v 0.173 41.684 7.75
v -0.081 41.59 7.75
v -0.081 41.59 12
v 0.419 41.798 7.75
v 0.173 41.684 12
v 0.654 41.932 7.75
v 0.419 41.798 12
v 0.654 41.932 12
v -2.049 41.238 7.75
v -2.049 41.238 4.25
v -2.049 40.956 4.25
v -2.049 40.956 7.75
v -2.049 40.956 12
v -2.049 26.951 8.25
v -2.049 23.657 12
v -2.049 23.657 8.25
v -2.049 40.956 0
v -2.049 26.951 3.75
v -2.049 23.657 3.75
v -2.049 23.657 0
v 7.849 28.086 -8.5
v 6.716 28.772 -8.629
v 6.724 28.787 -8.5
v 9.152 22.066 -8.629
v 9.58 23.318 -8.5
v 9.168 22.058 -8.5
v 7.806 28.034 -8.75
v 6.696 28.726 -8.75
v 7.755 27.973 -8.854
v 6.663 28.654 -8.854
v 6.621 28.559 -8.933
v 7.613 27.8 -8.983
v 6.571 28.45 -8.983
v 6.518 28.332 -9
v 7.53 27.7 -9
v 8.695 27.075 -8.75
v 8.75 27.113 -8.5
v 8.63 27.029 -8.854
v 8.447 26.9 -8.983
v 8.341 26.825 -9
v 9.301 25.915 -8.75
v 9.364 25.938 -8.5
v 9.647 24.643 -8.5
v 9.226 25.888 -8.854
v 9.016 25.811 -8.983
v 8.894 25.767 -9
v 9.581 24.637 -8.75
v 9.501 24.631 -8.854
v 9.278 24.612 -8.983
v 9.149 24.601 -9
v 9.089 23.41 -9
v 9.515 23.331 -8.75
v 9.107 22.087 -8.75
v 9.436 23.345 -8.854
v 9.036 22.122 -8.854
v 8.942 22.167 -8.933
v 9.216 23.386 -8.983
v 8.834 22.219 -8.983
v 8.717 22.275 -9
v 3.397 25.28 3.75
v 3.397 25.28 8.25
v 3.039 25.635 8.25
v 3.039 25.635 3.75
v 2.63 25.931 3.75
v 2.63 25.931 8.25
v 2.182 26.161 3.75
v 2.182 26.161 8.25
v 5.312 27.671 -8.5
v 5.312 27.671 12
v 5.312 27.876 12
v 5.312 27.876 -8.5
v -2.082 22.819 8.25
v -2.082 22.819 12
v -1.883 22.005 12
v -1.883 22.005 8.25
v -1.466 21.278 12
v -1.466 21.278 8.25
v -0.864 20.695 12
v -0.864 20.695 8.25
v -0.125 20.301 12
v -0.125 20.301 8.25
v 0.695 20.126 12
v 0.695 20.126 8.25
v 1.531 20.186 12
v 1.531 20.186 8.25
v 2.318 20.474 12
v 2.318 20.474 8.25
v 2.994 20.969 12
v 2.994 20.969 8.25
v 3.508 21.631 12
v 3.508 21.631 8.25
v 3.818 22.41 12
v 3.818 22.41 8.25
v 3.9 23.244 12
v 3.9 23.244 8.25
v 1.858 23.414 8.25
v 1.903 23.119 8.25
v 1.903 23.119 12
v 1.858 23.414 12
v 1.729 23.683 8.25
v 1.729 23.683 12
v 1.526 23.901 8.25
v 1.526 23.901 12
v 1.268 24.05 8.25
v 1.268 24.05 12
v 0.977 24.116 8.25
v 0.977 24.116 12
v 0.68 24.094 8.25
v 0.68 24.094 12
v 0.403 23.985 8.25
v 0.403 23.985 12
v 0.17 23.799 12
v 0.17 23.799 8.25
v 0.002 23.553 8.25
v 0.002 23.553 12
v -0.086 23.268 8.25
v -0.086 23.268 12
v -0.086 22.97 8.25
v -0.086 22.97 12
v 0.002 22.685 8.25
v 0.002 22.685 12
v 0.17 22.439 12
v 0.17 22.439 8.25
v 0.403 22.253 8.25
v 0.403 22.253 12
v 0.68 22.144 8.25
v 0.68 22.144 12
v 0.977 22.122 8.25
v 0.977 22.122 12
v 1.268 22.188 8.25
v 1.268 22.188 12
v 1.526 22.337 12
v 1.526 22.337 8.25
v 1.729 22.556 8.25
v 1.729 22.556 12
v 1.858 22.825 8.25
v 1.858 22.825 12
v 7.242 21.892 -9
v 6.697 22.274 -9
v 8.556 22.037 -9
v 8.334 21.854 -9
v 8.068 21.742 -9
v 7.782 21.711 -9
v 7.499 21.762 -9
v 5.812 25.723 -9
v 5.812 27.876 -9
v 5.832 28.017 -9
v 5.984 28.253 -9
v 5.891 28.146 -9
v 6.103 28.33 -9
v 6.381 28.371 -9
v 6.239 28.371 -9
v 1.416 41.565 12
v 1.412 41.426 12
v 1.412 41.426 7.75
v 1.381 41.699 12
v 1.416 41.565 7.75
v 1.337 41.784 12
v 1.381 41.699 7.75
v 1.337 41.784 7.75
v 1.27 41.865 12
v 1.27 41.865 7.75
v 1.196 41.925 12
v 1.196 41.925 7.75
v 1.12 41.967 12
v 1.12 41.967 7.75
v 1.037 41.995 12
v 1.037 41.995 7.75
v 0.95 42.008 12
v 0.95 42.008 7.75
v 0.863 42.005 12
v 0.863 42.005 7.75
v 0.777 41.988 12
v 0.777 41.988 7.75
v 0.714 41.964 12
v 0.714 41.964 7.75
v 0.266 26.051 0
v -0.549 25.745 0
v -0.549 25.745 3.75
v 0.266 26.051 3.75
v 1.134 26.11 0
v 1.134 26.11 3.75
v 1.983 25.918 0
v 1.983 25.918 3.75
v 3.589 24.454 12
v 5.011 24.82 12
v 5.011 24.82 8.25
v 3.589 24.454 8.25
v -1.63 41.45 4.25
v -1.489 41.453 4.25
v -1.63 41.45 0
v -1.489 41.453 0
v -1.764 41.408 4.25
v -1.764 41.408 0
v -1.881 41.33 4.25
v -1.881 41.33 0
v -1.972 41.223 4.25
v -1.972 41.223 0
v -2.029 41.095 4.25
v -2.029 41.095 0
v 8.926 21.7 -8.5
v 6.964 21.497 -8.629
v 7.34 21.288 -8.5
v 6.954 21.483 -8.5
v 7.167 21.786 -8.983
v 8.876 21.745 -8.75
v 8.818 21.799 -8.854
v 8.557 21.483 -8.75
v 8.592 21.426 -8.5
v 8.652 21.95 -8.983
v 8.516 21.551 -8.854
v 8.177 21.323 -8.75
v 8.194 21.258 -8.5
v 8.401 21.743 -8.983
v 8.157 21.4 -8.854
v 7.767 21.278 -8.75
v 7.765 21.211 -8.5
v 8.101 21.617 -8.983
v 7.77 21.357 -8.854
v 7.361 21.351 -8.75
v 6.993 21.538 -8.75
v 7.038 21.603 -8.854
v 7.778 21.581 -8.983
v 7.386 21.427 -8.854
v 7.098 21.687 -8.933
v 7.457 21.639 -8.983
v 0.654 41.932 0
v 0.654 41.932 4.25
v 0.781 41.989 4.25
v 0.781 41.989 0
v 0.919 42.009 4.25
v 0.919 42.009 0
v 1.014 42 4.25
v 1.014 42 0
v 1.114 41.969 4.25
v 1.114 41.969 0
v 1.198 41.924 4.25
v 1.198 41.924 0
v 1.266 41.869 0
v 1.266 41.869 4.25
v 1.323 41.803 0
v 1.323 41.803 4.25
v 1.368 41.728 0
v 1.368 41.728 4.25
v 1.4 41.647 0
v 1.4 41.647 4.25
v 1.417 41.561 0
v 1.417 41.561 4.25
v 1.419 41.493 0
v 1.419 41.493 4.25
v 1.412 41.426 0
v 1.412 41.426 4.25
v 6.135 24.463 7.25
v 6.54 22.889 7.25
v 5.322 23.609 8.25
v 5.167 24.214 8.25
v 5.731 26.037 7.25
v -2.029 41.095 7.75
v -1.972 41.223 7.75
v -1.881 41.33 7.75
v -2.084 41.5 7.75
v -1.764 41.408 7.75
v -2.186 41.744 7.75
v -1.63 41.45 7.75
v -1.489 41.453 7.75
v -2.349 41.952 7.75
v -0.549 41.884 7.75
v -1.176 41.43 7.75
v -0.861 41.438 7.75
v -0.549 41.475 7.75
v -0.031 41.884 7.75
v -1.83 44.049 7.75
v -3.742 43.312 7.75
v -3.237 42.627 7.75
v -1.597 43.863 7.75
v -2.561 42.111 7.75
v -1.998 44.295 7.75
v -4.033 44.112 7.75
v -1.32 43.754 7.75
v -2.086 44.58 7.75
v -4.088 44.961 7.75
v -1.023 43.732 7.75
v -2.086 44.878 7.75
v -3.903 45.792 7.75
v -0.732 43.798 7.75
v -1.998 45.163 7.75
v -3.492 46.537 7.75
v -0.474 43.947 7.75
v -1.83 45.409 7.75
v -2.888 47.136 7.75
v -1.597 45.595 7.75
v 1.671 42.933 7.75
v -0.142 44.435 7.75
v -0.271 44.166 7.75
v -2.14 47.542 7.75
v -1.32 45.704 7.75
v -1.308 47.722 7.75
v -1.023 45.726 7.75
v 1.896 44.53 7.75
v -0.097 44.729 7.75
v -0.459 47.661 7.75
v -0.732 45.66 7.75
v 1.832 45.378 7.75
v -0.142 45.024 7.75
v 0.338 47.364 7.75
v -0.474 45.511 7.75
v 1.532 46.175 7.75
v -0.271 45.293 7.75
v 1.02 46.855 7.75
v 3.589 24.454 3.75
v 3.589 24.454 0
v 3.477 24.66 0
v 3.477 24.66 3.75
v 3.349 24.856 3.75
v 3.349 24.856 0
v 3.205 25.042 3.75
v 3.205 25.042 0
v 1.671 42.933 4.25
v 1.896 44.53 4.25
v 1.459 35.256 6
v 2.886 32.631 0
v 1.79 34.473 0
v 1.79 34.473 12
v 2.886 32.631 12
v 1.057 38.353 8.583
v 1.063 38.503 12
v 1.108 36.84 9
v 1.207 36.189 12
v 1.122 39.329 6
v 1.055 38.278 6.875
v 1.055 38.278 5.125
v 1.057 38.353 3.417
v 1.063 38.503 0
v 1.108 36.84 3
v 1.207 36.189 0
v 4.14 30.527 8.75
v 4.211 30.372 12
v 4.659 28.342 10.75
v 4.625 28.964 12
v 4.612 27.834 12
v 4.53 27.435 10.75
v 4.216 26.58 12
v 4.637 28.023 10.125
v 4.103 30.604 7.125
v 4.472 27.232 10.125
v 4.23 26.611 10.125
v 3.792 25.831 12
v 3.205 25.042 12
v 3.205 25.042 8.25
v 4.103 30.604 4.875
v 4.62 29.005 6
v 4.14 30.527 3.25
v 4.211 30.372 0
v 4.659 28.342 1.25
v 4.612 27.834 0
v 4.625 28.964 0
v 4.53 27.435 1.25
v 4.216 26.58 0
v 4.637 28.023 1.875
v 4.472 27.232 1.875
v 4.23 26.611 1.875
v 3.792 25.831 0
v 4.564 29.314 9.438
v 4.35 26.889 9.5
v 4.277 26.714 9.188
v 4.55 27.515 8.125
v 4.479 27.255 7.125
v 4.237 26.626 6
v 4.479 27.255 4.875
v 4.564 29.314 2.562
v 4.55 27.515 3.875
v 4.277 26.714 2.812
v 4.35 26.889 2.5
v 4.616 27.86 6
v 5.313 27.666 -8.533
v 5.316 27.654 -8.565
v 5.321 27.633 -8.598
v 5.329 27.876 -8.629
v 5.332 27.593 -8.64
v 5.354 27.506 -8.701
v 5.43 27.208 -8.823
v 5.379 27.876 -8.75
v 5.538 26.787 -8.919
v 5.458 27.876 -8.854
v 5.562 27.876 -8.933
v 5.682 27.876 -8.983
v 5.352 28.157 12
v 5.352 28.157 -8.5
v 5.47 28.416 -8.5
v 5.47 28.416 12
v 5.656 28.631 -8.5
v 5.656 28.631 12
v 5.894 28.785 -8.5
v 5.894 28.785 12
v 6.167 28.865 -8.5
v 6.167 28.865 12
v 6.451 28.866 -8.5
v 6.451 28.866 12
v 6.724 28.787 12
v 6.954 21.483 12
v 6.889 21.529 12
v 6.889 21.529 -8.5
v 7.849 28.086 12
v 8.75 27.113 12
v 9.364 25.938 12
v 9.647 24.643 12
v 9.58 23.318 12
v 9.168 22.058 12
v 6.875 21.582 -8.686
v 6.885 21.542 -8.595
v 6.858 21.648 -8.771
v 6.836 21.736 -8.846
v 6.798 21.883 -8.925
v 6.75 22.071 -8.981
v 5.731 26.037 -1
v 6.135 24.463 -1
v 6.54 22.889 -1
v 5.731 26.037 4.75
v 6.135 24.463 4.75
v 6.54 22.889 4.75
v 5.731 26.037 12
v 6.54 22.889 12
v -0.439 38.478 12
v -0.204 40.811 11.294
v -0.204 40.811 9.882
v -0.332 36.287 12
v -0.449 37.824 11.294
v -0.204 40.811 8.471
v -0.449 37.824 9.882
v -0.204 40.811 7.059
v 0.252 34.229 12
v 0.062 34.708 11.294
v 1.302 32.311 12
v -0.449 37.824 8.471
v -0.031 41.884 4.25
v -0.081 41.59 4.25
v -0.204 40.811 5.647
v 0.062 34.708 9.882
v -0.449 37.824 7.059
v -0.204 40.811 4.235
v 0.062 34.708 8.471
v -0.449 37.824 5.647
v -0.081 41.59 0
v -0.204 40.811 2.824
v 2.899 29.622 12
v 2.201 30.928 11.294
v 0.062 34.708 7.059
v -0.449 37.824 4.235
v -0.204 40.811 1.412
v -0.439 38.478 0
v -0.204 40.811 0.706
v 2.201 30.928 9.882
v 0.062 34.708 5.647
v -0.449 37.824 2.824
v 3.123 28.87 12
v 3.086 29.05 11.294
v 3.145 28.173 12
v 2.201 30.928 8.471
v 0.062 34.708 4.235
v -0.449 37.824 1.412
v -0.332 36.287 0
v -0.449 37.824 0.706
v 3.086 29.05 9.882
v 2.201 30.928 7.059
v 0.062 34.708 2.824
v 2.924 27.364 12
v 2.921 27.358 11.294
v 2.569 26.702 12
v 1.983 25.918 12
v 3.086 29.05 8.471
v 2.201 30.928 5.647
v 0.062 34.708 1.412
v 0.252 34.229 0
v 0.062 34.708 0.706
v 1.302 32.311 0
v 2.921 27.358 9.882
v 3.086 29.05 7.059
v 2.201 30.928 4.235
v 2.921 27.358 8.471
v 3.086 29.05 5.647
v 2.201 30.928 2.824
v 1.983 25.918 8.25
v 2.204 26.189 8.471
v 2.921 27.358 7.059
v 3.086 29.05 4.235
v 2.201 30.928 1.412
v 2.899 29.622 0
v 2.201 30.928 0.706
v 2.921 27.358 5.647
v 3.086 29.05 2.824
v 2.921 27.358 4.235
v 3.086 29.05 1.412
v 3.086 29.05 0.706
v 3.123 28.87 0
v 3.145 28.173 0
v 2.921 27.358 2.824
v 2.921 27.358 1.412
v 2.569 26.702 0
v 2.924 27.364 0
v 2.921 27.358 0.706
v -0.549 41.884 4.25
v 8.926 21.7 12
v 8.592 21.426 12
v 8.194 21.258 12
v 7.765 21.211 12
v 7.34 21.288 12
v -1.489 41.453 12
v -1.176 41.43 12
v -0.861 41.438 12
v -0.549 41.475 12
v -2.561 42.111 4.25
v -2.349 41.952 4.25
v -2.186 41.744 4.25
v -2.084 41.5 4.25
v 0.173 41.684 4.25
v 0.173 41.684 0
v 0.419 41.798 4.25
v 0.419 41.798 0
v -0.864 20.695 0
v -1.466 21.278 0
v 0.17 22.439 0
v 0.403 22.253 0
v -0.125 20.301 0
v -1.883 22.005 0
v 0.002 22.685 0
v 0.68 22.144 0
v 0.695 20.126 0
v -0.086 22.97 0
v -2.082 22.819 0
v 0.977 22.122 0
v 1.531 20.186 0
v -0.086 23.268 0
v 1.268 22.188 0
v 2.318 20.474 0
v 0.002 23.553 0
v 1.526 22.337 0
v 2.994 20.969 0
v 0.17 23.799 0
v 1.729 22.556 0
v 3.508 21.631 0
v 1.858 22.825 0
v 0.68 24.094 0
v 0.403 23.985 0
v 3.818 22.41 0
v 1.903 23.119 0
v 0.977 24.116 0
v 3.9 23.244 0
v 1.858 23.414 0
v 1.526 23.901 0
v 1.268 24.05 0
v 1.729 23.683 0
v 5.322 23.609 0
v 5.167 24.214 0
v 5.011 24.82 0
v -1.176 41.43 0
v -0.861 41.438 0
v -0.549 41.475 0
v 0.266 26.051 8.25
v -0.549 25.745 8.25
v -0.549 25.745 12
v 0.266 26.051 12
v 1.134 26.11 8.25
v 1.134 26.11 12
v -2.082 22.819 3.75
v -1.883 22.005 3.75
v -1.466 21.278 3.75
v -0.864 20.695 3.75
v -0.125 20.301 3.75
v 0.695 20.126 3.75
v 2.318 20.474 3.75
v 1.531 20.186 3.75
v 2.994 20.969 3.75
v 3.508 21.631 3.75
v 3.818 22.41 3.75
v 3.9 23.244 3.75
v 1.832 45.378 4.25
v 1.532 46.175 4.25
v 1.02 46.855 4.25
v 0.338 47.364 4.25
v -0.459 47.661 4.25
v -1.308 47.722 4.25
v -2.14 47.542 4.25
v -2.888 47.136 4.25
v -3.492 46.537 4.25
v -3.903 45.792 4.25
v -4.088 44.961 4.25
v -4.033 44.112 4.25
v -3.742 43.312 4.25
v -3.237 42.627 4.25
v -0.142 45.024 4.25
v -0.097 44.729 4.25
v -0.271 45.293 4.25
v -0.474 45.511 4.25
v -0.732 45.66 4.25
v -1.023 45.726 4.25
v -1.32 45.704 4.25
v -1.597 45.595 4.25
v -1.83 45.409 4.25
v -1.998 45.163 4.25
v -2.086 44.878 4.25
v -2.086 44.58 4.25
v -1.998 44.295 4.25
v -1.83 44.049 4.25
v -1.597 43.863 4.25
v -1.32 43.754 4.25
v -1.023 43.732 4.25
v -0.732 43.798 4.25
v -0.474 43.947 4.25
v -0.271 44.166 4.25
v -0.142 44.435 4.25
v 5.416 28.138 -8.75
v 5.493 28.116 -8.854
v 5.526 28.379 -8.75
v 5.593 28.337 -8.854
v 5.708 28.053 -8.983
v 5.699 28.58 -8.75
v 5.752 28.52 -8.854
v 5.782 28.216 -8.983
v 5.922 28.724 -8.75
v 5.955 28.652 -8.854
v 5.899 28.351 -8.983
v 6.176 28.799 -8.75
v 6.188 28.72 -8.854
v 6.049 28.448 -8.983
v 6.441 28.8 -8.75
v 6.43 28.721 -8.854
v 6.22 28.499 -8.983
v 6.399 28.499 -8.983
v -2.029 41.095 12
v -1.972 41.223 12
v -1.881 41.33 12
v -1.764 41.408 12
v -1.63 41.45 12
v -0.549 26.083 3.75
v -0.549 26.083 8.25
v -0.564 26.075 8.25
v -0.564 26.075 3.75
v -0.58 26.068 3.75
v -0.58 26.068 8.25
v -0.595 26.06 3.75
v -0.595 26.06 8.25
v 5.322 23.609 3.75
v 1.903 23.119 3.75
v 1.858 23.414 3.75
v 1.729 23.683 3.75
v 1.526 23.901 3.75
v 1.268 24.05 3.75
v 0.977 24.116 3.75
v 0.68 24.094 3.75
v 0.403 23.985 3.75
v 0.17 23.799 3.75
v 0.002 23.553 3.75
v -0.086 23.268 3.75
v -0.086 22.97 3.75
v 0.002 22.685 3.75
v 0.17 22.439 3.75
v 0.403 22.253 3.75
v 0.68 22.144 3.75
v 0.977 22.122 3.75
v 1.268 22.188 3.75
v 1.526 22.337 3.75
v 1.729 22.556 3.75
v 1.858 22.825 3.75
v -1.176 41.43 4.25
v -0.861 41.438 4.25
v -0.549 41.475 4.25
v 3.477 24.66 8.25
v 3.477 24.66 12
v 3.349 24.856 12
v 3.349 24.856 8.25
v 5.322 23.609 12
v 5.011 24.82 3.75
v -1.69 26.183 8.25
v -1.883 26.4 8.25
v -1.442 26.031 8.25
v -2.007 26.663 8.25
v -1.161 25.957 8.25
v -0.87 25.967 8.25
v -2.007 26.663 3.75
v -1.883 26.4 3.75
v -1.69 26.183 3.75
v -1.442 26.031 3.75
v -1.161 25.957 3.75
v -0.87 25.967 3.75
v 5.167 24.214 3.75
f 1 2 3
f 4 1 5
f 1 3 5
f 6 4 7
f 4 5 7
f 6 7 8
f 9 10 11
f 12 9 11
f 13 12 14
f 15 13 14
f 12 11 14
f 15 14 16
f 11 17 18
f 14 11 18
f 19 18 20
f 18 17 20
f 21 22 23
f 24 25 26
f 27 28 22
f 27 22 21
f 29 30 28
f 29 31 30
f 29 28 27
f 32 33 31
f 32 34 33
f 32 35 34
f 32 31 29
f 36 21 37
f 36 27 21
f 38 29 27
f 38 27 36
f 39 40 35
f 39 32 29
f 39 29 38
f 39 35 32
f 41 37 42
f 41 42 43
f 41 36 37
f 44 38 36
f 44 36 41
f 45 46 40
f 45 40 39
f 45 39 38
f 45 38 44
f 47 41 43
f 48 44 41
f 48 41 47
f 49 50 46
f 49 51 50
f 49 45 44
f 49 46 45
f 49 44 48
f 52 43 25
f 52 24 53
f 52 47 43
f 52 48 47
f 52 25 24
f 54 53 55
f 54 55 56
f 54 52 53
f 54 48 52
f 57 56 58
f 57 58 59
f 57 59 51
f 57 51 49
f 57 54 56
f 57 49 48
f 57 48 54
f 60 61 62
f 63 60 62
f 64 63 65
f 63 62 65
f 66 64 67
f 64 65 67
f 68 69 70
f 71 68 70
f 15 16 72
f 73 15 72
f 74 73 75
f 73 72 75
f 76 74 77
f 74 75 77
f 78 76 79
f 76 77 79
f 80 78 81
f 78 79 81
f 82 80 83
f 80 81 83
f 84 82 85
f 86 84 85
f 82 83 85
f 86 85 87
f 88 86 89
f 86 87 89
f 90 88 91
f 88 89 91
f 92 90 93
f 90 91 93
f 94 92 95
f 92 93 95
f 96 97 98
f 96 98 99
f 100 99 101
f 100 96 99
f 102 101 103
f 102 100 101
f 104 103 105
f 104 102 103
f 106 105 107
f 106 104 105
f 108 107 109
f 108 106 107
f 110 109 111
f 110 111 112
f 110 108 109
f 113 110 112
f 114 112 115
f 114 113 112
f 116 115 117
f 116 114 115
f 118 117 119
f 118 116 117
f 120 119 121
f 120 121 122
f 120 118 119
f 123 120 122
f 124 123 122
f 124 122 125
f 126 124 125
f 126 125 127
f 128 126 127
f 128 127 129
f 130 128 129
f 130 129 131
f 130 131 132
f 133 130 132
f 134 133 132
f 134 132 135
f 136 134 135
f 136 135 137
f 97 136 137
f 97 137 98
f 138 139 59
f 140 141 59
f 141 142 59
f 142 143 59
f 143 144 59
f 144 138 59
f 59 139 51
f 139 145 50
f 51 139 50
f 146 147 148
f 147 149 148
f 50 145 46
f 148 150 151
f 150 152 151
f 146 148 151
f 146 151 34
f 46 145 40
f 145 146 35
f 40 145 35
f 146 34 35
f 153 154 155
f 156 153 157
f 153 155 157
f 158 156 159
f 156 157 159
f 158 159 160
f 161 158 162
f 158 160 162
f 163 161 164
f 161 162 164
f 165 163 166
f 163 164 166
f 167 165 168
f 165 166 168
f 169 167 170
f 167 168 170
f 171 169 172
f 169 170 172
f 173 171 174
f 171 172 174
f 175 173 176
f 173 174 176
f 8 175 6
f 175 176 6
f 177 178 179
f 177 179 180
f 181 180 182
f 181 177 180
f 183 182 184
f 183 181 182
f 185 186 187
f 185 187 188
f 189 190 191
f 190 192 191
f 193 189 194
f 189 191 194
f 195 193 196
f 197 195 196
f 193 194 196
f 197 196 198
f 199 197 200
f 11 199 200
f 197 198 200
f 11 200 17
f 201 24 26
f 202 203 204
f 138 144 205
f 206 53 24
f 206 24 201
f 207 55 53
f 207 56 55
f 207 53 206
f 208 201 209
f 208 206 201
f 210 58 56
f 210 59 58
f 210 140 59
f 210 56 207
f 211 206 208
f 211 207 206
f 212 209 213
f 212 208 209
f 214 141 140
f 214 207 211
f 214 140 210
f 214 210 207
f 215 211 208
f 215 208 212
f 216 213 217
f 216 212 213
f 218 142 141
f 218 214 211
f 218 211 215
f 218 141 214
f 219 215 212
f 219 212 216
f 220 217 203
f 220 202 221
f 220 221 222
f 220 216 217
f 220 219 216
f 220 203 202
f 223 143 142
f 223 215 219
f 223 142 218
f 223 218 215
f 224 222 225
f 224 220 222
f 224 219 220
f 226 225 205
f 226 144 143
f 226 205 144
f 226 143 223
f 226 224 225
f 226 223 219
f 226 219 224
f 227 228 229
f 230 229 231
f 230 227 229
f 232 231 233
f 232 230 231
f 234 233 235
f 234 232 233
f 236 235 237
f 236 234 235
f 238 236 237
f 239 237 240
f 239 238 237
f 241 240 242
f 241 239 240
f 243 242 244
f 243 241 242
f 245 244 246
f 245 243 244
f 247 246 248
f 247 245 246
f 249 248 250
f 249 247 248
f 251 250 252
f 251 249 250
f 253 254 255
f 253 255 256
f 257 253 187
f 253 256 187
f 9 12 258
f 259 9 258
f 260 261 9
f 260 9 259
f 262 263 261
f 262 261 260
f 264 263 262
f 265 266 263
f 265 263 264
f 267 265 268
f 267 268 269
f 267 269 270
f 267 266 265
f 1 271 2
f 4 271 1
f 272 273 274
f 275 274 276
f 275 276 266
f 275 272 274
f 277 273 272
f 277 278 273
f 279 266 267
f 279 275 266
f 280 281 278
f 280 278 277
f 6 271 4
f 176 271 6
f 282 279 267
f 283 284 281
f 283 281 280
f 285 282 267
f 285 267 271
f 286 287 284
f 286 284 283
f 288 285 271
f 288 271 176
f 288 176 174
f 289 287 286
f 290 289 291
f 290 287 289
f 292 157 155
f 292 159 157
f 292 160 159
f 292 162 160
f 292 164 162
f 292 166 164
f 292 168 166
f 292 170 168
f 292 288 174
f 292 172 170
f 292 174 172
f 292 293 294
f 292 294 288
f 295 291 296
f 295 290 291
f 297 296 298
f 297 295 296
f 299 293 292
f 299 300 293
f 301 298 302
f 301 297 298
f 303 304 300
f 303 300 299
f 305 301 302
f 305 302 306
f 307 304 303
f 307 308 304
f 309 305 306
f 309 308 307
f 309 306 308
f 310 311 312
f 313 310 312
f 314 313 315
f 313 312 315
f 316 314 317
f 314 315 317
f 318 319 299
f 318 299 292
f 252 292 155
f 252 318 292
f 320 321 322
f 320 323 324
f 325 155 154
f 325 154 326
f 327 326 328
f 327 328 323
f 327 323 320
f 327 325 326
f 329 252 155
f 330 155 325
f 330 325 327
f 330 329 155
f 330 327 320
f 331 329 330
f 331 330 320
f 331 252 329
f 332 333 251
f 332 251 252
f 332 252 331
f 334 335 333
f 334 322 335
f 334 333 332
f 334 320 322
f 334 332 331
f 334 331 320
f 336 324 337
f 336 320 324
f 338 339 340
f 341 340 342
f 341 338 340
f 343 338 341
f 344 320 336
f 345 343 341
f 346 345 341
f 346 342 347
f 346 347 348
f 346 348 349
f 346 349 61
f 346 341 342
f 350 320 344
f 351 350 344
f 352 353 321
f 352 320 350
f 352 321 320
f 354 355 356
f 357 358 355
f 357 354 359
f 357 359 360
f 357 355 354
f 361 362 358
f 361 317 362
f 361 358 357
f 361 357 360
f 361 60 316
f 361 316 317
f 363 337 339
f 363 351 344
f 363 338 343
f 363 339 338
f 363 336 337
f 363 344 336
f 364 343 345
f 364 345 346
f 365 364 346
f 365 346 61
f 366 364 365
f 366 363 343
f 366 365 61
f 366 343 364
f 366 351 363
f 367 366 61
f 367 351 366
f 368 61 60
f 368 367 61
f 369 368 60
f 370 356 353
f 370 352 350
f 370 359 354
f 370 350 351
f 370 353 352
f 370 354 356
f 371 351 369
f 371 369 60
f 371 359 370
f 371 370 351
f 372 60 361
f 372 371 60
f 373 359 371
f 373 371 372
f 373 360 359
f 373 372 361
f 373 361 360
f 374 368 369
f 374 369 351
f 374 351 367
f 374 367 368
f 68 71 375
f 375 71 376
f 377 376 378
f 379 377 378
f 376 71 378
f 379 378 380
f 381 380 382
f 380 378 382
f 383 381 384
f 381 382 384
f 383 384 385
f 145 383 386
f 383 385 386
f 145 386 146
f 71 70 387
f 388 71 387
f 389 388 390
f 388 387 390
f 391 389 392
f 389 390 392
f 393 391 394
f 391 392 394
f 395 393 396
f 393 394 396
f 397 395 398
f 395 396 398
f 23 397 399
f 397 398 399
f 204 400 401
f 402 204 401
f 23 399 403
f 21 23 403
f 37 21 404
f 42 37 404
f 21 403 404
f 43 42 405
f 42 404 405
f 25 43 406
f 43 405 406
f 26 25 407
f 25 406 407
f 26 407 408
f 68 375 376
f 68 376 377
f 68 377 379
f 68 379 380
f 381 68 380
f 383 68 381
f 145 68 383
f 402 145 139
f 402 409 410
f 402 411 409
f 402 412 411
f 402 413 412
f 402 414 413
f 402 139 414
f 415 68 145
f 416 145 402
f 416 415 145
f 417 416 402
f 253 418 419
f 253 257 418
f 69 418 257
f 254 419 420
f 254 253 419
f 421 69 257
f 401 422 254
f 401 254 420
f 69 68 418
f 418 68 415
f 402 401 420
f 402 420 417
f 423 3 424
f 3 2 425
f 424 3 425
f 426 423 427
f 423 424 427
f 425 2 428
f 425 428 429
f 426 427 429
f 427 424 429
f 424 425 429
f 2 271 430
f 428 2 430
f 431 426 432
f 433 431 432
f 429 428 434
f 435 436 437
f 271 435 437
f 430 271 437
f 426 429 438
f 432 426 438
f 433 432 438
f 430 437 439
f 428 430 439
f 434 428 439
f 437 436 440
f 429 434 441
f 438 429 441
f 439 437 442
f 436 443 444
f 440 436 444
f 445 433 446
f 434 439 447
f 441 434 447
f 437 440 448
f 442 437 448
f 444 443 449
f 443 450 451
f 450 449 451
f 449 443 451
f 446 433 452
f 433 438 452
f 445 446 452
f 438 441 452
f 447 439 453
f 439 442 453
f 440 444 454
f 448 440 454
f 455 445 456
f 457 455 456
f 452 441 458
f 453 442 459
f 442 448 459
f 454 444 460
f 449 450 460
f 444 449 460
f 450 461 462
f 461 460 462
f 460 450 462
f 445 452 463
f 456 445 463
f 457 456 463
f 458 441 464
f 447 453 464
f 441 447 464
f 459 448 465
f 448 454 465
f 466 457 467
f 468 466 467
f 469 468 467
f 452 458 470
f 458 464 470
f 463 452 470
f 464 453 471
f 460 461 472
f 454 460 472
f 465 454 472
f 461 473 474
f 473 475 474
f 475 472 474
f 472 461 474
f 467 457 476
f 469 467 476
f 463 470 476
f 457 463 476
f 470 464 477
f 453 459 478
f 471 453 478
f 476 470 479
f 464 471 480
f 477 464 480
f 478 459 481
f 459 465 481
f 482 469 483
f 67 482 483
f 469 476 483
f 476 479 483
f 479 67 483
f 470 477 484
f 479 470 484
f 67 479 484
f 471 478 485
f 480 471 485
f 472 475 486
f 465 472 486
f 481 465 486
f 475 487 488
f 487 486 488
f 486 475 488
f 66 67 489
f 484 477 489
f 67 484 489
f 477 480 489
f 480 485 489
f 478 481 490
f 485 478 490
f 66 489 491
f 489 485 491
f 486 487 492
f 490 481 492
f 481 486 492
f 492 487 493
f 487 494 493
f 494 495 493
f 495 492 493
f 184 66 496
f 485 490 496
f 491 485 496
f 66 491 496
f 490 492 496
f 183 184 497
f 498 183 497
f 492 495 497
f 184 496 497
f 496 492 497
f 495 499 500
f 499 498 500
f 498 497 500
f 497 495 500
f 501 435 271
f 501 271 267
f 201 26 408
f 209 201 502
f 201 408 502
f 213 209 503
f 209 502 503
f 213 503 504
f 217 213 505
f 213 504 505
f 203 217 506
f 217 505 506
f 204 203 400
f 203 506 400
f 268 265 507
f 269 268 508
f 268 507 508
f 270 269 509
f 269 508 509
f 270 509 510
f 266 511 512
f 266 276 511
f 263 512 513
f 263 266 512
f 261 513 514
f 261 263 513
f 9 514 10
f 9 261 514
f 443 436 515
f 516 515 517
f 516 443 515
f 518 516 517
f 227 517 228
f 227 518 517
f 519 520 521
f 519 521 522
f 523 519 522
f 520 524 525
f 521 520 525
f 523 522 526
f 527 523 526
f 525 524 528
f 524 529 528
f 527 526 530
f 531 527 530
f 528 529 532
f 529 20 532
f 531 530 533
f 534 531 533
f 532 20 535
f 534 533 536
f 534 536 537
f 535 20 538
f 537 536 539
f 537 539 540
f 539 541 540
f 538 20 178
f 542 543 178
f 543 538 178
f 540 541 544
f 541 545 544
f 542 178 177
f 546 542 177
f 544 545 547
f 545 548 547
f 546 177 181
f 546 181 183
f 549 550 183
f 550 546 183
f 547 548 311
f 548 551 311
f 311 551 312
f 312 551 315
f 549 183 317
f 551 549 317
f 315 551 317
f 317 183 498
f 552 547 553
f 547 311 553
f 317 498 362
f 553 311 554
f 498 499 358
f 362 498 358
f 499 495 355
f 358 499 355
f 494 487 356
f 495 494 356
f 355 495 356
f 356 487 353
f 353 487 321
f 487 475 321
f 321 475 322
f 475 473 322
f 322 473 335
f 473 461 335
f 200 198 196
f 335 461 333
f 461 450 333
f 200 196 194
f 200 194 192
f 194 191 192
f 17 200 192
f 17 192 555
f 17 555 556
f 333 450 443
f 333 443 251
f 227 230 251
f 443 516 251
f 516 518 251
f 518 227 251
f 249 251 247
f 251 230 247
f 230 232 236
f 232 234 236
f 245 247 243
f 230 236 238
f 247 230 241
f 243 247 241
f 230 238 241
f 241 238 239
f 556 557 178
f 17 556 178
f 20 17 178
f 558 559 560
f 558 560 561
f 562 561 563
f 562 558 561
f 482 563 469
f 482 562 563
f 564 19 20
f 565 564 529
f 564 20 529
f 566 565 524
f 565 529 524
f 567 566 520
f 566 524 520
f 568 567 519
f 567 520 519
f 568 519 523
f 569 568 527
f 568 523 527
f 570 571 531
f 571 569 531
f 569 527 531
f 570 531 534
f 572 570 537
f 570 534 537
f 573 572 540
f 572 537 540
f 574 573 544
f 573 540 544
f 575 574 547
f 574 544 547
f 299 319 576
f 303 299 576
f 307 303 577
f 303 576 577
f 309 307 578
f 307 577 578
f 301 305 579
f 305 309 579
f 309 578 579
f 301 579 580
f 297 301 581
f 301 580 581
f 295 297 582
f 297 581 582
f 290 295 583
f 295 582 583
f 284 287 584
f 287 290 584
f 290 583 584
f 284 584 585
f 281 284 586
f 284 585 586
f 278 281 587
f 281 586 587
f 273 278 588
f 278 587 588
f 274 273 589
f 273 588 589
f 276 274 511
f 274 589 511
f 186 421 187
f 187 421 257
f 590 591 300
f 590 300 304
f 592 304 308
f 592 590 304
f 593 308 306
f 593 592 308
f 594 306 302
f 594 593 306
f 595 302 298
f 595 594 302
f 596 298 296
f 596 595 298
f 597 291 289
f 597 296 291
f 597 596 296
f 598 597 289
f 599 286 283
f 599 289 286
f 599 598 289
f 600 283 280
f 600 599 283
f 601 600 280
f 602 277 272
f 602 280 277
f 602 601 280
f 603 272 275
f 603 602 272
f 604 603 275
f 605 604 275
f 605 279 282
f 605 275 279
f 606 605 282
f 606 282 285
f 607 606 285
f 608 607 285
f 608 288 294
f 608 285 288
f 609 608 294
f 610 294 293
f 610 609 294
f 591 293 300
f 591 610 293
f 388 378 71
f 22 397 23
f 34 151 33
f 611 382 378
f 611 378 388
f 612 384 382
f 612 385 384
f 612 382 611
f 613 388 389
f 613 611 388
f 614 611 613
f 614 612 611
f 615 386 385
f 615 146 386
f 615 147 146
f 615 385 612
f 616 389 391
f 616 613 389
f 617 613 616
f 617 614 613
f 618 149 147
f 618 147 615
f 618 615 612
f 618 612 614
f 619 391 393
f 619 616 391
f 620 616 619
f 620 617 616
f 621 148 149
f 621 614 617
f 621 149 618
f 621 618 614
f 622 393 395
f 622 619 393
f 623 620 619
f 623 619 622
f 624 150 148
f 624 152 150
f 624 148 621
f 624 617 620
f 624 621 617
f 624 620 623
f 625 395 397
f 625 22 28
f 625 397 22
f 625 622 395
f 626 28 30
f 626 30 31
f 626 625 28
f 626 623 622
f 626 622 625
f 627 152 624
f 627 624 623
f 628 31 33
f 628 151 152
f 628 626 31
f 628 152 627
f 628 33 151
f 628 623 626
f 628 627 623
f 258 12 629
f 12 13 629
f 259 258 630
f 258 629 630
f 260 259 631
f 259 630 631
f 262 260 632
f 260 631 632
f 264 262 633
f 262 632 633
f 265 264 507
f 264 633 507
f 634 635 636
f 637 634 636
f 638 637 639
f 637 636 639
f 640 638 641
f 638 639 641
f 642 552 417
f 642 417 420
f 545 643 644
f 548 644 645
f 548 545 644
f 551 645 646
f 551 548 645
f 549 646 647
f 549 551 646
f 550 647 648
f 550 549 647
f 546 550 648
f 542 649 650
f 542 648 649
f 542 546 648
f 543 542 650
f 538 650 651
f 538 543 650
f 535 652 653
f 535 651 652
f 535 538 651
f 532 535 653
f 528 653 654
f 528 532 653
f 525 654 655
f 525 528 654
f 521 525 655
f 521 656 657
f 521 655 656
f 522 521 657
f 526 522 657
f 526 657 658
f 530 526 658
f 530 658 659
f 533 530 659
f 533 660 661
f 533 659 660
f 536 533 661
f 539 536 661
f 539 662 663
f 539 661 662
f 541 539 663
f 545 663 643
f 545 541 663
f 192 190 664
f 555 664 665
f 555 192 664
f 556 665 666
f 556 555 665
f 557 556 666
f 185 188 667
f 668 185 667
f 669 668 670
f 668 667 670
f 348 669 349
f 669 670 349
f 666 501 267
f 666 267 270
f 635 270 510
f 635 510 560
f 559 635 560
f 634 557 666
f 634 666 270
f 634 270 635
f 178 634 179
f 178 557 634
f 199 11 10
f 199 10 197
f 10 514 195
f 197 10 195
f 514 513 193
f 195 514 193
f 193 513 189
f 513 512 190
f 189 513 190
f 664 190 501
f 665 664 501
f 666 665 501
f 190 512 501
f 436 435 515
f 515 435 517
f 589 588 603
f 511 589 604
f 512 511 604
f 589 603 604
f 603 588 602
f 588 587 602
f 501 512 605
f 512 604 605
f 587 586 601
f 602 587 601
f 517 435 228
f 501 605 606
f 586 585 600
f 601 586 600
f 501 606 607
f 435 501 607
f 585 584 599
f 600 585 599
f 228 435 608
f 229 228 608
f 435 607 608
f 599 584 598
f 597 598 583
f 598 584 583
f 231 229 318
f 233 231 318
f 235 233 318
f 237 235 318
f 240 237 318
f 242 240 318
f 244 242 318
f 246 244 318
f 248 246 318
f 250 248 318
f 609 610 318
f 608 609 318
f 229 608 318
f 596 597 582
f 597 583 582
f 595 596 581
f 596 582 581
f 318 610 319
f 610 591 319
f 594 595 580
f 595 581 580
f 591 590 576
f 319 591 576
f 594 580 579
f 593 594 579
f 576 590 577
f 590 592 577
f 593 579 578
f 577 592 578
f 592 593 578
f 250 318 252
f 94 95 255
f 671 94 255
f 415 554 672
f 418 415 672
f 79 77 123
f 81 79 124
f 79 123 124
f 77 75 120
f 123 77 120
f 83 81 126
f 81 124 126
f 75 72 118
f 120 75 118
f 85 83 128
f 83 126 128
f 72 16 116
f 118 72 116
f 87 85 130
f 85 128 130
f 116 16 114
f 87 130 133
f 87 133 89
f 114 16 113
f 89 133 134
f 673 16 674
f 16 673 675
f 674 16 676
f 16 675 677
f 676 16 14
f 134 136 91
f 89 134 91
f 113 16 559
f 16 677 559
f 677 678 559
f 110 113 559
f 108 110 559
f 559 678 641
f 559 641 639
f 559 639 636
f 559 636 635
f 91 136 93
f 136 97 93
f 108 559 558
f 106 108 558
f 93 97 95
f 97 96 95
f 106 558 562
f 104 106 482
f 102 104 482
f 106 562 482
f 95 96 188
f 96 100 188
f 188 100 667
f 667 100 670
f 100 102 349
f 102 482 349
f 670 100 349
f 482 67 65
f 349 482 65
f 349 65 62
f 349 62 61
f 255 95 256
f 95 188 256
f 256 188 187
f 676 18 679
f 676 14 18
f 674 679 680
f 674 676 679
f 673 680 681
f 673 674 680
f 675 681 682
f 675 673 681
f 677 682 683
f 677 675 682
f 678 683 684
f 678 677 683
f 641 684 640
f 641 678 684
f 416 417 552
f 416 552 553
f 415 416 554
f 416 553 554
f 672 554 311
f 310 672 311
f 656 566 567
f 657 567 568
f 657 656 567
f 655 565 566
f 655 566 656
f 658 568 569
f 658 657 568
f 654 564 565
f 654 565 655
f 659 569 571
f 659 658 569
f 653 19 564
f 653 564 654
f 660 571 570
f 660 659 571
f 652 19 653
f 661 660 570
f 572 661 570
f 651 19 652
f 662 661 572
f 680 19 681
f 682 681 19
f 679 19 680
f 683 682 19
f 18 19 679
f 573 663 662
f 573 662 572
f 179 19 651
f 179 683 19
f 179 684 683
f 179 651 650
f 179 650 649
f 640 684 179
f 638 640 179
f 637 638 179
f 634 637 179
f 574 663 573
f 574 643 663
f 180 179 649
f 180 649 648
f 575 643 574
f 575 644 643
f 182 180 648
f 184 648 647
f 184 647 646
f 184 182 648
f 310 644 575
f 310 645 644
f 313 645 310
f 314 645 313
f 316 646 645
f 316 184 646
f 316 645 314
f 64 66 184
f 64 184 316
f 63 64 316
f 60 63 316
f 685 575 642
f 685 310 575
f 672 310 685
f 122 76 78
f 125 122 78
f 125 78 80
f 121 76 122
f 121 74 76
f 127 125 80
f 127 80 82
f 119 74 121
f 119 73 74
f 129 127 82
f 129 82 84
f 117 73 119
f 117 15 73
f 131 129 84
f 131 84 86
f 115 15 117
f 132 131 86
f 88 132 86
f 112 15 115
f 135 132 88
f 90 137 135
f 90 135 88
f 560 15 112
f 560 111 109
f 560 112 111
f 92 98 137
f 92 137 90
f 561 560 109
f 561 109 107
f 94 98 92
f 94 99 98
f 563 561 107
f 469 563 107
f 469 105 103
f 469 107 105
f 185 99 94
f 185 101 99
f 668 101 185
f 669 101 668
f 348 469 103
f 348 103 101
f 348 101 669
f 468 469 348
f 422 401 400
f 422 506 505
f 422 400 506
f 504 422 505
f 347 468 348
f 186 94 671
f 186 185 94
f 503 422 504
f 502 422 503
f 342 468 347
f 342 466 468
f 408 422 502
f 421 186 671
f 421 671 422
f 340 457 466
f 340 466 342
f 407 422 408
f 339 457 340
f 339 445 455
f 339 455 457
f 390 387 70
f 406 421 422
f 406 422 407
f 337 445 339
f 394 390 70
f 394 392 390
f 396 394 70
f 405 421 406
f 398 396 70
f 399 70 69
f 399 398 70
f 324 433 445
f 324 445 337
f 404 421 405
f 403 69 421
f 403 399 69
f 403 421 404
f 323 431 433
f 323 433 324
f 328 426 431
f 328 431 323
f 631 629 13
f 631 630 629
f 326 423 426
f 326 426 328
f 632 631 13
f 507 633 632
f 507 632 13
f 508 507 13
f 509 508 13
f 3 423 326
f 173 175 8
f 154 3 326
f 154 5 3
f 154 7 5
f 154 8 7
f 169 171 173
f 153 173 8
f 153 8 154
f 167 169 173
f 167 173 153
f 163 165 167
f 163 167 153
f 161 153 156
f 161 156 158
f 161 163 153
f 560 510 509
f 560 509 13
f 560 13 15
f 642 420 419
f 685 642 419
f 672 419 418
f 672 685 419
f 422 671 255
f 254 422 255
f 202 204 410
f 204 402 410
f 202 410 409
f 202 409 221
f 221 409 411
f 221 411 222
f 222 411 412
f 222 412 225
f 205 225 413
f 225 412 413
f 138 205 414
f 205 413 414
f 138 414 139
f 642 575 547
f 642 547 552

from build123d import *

# Parameters (mm, degrees)
SKETCH1_R                = 1
BOSS_EXTRUDE1_DEPTH      = 12
SKETCH2_R                = 3.3
CUT_EXTRUDE1_DEPTH       = 4.25
SKETCH3_R                = 3.3
CUT_EXTRUDE2_DEPTH       = 2.25
CUT_EXTRUDE2_DEPTH_BACK  = 2.25
BOSS_EXTRUDE4_DEPTH      = 12
BOSS_EXTRUDE4_DEPTH_BACK = 9
BOSS_EXTRUDE5_DEPTH      = 21
BOSS_EXTRUDE6_DEPTH      = 3.75
BOSS_EXTRUDE7_DEPTH      = 3.75
FILLET1_R                = 0.5
FILLET2_R                = 1
FILLET10_R               = 1.5
FILLET11_R               = 1
CHAMFER5_SIZE            = 1
FILLET12_R               = 1
FILLET13_R               = 0.5


with BuildPart() as part:
    # Sketch1 → Boss-Extrude1 (new body)
    with BuildSketch(Plane.XY):
        with BuildLine():
            Line((-2.048815827, 41.884151299), (-2.048815827, 23.656682303))
            ThreePointArc((-2.048815827, 23.656682303), (1.66754925, 20.218418642), (3.205412143, 25.042110601))
            add(Edge.make_bspline(
                [(1.896008332, 44.529660516), (1.616069448, 41.758878479), (-0.936917255, 33.955197005), (6.844694938, 29.417505011), (3.205412143, 25.042110601)],
                knots=[0, 0, 0, 0, 0.461184527, 1, 1, 1, 1], degree=3))
            ThreePointArc((1.896008332, 44.529660516), (-2.768270934, 47.220856283), (-2.048815827, 41.884151299))
        make_face()
        with Locations((-1.097343641, 44.729270045)):
            Circle(SKETCH1_R, mode=Mode.SUBTRACT)
        with Locations((0.902656359, 23.119270045)):
            Circle(SKETCH1_R, mode=Mode.SUBTRACT)
        with BuildLine():
            Line((-0.031319306, 41.884151299), (-0.548815827, 41.884151299))
            Line((-0.548815827, 41.884151299), (-0.548815827, 25.744765902))
            ThreePointArc((-0.548815827, 25.744765902), (0.697826573, 26.112269337), (1.982912704, 25.918028026))
            add(Edge.make_bspline(
                [(-0.031319306, 41.884151299), (-0.050798368, 41.769911378), (-0.110231132, 41.41757497), (-0.243210983, 40.585051968), (-0.402027872, 39.353261852), (-0.479087992, 37.828213551), (-0.375856847, 36.275358456), (0.009969142, 34.681069755), (0.941317901, 32.770668216), (2.035404053, 31.246938586), (2.80471042, 29.909471533), (3.128629571, 29.030940173), (3.19641087, 28.267404516), (3.032335606, 27.550309668), (2.666289508, 26.829120101), (2.334869511, 26.350170873), (2.106769915, 26.067173099), (2.026097439, 25.969974031), (1.996829195, 25.934759382), (1.982912704, 25.918028026)],
                knots=[0.149200089, 0.149200089, 0.149200089, 0.149200089, 0.165683382, 0.19960026, 0.265533433, 0.331466606, 0.397399778, 0.463332951, 0.529266124, 0.661132469, 0.727065642, 0.792998815, 0.858931987, 0.92486516, 0.957831746, 0.990798333, 0.999039979, 1.001358499, 1.00341891, 1.00341891, 1.00341891, 1.00341891], degree=3))
        make_face(mode=Mode.SUBTRACT)
    extrude(amount=BOSS_EXTRUDE1_DEPTH)

    # Sketch2 → Cut-Extrude1 (cut)
    with BuildSketch(Plane.XY.offset(12)):
        with Locations((-1.097343641, 44.729270045)):
            Circle(SKETCH2_R)
    cut_extrude1 = extrude(amount=-CUT_EXTRUDE1_DEPTH, mode=Mode.SUBTRACT)

    # Mirror1: Cut-Extrude1 across plane
    add(cut_extrude1.mirror(Plane.XY.offset(6)), mode=Mode.SUBTRACT)

    # Sketch3 → Cut-Extrude2 (cut, two sides)
    with BuildSketch(Plane.XY.offset(6)) as cut_extrude2_sk:
        with Locations((0.902656359, 23.119270045)):
            Circle(SKETCH3_R)
    extrude(amount=CUT_EXTRUDE2_DEPTH, mode=Mode.SUBTRACT)
    extrude(cut_extrude2_sk.sketch, amount=-CUT_EXTRUDE2_DEPTH_BACK, mode=Mode.SUBTRACT)



with BuildPart() as body_2:
    # Sketch6 → Boss-Extrude4 (new, two sides)
    with BuildSketch(Plane.XY) as boss_extrude4_sk:
        with BuildLine():
            Line((8.147666431, 20.643852604), (6.888843248, 21.528699147))
            ThreePointArc((6.888843248, 21.528699147), (8.054417737, 25.101419264), (5.311682387, 27.670523333))
            Line((5.311682387, 27.670523333), (5.311682387, 29.188822824))
            ThreePointArc((5.311682387, 29.188822824), (9.409872676, 25.805866797), (8.147666431, 20.643852604))
        make_face()
    extrude(amount=BOSS_EXTRUDE4_DEPTH)
    extrude(boss_extrude4_sk.sketch, amount=-BOSS_EXTRUDE4_DEPTH_BACK)

    # Sketch7 → Boss-Extrude5 (add)
    with BuildSketch(Plane.XY.offset(12)):
        with BuildLine():
            Line((5.311682387, 27.670523333), (6.888843248, 21.528699147))
            ThreePointArc((6.888843248, 21.528699147), (8.054417737, 25.101419264), (5.311682387, 27.670523333))
        make_face()
    extrude(amount=-BOSS_EXTRUDE5_DEPTH)


with BuildPart() as part_1:
    add(part.part)

    add(body_2.part)  # Boss-Extrude6 merges body 2
    # Sketch8 → Boss-Extrude6 (add)
    with BuildSketch(Plane.XY.offset(12)):
        Polygon((6.135349697, 24.462974926), (5.979899244, 25.068334452), (3.262106691, 24.370431694), (3.573007598, 23.15971264), (6.29080015, 23.857615399), align=None)
    extrude(amount=-BOSS_EXTRUDE6_DEPTH)

    # Sketch10 → Boss-Extrude7 (add)
    with BuildSketch(Plane(origin=(0, 0, 0), x_dir=(-1, 0, 0), z_dir=(0, 0, -1))):
        Polygon((-3.262106691, 24.370431694), (-3.573007598, 23.15971264), (-6.29080015, 23.857615399), (-6.135349697, 24.462974926), (-5.979899244, 25.068334452), align=None)
    extrude(amount=-BOSS_EXTRUDE7_DEPTH)

    # Fillet1
    fillet1_edges = [part_1.edges().sort_by_distance(p)[0] for p in [
        (1.670824854, 42.932817101, 9.875),
        (-2.048815827, 41.569412346, 9.875),
        (1.670824854, 42.932817101, 2.125),
        (-2.048815827, 41.569412346, 2.125),
    ]]
    fillet(fillet1_edges, radius=FILLET1_R)

    # Fillet2
    fillet2_edges = [part_1.edges().sort_by_distance(p)[0] for p in [
        (-2.048815827, 41.884151299, 6),
    ]]
    fillet(fillet2_edges, radius=FILLET2_R)

    # Fillet10
    fillet10_edges = [part_1.edges().sort_by_distance(p)[0] for p in [
        (8.147666431, 20.643852604, 1.5),
    ]]
    fillet(fillet10_edges, radius=FILLET10_R)

    # Fillet11
    fillet11_edges = [part_1.edges().sort_by_distance(p)[0] for p in [
        (-2.048815827, 24.595349967, 6),
    ]]
    fillet(fillet11_edges, radius=FILLET11_R)

    # Chamfer5
    chamfer5_edges = [part_1.edges().sort_by_distance(p)[0] for p in [
        (6.29080015, 23.857615399, 10.125),
        (5.979899244, 25.068334452, 10.125),
        (6.135349697, 24.462974926, 8.25),
        (6.135349697, 24.462974926, 0),
        (5.979899244, 25.068334452, 1.875),
        (6.135349697, 24.462974926, 3.75),
        (6.29080015, 23.857615399, 1.875),
    ]]
    chamfer(chamfer5_edges, length=CHAMFER5_SIZE)

    # Fillet12
    fillet12_edges = [part_1.edges().sort_by_distance(p)[0] for p in [
        (5.311682387, 29.188822824, 1.5),
    ]]
    fillet(fillet12_edges, radius=FILLET12_R)

    # Fillet13
    fillet13_edges = [part_1.edges().sort_by_distance(p)[0] for p in [
        (6.921467432, 21.505767097, -9),
        (9.36399081, 25.937907991, -9),
        (8.194027009, 21.258237643, -9),
        (5.311682387, 27.773240907, -9),
        (5.769381502, 28.716142835, -9),
    ]]
    fillet(fillet13_edges, radius=FILLET13_R)


solid = part_1.part
